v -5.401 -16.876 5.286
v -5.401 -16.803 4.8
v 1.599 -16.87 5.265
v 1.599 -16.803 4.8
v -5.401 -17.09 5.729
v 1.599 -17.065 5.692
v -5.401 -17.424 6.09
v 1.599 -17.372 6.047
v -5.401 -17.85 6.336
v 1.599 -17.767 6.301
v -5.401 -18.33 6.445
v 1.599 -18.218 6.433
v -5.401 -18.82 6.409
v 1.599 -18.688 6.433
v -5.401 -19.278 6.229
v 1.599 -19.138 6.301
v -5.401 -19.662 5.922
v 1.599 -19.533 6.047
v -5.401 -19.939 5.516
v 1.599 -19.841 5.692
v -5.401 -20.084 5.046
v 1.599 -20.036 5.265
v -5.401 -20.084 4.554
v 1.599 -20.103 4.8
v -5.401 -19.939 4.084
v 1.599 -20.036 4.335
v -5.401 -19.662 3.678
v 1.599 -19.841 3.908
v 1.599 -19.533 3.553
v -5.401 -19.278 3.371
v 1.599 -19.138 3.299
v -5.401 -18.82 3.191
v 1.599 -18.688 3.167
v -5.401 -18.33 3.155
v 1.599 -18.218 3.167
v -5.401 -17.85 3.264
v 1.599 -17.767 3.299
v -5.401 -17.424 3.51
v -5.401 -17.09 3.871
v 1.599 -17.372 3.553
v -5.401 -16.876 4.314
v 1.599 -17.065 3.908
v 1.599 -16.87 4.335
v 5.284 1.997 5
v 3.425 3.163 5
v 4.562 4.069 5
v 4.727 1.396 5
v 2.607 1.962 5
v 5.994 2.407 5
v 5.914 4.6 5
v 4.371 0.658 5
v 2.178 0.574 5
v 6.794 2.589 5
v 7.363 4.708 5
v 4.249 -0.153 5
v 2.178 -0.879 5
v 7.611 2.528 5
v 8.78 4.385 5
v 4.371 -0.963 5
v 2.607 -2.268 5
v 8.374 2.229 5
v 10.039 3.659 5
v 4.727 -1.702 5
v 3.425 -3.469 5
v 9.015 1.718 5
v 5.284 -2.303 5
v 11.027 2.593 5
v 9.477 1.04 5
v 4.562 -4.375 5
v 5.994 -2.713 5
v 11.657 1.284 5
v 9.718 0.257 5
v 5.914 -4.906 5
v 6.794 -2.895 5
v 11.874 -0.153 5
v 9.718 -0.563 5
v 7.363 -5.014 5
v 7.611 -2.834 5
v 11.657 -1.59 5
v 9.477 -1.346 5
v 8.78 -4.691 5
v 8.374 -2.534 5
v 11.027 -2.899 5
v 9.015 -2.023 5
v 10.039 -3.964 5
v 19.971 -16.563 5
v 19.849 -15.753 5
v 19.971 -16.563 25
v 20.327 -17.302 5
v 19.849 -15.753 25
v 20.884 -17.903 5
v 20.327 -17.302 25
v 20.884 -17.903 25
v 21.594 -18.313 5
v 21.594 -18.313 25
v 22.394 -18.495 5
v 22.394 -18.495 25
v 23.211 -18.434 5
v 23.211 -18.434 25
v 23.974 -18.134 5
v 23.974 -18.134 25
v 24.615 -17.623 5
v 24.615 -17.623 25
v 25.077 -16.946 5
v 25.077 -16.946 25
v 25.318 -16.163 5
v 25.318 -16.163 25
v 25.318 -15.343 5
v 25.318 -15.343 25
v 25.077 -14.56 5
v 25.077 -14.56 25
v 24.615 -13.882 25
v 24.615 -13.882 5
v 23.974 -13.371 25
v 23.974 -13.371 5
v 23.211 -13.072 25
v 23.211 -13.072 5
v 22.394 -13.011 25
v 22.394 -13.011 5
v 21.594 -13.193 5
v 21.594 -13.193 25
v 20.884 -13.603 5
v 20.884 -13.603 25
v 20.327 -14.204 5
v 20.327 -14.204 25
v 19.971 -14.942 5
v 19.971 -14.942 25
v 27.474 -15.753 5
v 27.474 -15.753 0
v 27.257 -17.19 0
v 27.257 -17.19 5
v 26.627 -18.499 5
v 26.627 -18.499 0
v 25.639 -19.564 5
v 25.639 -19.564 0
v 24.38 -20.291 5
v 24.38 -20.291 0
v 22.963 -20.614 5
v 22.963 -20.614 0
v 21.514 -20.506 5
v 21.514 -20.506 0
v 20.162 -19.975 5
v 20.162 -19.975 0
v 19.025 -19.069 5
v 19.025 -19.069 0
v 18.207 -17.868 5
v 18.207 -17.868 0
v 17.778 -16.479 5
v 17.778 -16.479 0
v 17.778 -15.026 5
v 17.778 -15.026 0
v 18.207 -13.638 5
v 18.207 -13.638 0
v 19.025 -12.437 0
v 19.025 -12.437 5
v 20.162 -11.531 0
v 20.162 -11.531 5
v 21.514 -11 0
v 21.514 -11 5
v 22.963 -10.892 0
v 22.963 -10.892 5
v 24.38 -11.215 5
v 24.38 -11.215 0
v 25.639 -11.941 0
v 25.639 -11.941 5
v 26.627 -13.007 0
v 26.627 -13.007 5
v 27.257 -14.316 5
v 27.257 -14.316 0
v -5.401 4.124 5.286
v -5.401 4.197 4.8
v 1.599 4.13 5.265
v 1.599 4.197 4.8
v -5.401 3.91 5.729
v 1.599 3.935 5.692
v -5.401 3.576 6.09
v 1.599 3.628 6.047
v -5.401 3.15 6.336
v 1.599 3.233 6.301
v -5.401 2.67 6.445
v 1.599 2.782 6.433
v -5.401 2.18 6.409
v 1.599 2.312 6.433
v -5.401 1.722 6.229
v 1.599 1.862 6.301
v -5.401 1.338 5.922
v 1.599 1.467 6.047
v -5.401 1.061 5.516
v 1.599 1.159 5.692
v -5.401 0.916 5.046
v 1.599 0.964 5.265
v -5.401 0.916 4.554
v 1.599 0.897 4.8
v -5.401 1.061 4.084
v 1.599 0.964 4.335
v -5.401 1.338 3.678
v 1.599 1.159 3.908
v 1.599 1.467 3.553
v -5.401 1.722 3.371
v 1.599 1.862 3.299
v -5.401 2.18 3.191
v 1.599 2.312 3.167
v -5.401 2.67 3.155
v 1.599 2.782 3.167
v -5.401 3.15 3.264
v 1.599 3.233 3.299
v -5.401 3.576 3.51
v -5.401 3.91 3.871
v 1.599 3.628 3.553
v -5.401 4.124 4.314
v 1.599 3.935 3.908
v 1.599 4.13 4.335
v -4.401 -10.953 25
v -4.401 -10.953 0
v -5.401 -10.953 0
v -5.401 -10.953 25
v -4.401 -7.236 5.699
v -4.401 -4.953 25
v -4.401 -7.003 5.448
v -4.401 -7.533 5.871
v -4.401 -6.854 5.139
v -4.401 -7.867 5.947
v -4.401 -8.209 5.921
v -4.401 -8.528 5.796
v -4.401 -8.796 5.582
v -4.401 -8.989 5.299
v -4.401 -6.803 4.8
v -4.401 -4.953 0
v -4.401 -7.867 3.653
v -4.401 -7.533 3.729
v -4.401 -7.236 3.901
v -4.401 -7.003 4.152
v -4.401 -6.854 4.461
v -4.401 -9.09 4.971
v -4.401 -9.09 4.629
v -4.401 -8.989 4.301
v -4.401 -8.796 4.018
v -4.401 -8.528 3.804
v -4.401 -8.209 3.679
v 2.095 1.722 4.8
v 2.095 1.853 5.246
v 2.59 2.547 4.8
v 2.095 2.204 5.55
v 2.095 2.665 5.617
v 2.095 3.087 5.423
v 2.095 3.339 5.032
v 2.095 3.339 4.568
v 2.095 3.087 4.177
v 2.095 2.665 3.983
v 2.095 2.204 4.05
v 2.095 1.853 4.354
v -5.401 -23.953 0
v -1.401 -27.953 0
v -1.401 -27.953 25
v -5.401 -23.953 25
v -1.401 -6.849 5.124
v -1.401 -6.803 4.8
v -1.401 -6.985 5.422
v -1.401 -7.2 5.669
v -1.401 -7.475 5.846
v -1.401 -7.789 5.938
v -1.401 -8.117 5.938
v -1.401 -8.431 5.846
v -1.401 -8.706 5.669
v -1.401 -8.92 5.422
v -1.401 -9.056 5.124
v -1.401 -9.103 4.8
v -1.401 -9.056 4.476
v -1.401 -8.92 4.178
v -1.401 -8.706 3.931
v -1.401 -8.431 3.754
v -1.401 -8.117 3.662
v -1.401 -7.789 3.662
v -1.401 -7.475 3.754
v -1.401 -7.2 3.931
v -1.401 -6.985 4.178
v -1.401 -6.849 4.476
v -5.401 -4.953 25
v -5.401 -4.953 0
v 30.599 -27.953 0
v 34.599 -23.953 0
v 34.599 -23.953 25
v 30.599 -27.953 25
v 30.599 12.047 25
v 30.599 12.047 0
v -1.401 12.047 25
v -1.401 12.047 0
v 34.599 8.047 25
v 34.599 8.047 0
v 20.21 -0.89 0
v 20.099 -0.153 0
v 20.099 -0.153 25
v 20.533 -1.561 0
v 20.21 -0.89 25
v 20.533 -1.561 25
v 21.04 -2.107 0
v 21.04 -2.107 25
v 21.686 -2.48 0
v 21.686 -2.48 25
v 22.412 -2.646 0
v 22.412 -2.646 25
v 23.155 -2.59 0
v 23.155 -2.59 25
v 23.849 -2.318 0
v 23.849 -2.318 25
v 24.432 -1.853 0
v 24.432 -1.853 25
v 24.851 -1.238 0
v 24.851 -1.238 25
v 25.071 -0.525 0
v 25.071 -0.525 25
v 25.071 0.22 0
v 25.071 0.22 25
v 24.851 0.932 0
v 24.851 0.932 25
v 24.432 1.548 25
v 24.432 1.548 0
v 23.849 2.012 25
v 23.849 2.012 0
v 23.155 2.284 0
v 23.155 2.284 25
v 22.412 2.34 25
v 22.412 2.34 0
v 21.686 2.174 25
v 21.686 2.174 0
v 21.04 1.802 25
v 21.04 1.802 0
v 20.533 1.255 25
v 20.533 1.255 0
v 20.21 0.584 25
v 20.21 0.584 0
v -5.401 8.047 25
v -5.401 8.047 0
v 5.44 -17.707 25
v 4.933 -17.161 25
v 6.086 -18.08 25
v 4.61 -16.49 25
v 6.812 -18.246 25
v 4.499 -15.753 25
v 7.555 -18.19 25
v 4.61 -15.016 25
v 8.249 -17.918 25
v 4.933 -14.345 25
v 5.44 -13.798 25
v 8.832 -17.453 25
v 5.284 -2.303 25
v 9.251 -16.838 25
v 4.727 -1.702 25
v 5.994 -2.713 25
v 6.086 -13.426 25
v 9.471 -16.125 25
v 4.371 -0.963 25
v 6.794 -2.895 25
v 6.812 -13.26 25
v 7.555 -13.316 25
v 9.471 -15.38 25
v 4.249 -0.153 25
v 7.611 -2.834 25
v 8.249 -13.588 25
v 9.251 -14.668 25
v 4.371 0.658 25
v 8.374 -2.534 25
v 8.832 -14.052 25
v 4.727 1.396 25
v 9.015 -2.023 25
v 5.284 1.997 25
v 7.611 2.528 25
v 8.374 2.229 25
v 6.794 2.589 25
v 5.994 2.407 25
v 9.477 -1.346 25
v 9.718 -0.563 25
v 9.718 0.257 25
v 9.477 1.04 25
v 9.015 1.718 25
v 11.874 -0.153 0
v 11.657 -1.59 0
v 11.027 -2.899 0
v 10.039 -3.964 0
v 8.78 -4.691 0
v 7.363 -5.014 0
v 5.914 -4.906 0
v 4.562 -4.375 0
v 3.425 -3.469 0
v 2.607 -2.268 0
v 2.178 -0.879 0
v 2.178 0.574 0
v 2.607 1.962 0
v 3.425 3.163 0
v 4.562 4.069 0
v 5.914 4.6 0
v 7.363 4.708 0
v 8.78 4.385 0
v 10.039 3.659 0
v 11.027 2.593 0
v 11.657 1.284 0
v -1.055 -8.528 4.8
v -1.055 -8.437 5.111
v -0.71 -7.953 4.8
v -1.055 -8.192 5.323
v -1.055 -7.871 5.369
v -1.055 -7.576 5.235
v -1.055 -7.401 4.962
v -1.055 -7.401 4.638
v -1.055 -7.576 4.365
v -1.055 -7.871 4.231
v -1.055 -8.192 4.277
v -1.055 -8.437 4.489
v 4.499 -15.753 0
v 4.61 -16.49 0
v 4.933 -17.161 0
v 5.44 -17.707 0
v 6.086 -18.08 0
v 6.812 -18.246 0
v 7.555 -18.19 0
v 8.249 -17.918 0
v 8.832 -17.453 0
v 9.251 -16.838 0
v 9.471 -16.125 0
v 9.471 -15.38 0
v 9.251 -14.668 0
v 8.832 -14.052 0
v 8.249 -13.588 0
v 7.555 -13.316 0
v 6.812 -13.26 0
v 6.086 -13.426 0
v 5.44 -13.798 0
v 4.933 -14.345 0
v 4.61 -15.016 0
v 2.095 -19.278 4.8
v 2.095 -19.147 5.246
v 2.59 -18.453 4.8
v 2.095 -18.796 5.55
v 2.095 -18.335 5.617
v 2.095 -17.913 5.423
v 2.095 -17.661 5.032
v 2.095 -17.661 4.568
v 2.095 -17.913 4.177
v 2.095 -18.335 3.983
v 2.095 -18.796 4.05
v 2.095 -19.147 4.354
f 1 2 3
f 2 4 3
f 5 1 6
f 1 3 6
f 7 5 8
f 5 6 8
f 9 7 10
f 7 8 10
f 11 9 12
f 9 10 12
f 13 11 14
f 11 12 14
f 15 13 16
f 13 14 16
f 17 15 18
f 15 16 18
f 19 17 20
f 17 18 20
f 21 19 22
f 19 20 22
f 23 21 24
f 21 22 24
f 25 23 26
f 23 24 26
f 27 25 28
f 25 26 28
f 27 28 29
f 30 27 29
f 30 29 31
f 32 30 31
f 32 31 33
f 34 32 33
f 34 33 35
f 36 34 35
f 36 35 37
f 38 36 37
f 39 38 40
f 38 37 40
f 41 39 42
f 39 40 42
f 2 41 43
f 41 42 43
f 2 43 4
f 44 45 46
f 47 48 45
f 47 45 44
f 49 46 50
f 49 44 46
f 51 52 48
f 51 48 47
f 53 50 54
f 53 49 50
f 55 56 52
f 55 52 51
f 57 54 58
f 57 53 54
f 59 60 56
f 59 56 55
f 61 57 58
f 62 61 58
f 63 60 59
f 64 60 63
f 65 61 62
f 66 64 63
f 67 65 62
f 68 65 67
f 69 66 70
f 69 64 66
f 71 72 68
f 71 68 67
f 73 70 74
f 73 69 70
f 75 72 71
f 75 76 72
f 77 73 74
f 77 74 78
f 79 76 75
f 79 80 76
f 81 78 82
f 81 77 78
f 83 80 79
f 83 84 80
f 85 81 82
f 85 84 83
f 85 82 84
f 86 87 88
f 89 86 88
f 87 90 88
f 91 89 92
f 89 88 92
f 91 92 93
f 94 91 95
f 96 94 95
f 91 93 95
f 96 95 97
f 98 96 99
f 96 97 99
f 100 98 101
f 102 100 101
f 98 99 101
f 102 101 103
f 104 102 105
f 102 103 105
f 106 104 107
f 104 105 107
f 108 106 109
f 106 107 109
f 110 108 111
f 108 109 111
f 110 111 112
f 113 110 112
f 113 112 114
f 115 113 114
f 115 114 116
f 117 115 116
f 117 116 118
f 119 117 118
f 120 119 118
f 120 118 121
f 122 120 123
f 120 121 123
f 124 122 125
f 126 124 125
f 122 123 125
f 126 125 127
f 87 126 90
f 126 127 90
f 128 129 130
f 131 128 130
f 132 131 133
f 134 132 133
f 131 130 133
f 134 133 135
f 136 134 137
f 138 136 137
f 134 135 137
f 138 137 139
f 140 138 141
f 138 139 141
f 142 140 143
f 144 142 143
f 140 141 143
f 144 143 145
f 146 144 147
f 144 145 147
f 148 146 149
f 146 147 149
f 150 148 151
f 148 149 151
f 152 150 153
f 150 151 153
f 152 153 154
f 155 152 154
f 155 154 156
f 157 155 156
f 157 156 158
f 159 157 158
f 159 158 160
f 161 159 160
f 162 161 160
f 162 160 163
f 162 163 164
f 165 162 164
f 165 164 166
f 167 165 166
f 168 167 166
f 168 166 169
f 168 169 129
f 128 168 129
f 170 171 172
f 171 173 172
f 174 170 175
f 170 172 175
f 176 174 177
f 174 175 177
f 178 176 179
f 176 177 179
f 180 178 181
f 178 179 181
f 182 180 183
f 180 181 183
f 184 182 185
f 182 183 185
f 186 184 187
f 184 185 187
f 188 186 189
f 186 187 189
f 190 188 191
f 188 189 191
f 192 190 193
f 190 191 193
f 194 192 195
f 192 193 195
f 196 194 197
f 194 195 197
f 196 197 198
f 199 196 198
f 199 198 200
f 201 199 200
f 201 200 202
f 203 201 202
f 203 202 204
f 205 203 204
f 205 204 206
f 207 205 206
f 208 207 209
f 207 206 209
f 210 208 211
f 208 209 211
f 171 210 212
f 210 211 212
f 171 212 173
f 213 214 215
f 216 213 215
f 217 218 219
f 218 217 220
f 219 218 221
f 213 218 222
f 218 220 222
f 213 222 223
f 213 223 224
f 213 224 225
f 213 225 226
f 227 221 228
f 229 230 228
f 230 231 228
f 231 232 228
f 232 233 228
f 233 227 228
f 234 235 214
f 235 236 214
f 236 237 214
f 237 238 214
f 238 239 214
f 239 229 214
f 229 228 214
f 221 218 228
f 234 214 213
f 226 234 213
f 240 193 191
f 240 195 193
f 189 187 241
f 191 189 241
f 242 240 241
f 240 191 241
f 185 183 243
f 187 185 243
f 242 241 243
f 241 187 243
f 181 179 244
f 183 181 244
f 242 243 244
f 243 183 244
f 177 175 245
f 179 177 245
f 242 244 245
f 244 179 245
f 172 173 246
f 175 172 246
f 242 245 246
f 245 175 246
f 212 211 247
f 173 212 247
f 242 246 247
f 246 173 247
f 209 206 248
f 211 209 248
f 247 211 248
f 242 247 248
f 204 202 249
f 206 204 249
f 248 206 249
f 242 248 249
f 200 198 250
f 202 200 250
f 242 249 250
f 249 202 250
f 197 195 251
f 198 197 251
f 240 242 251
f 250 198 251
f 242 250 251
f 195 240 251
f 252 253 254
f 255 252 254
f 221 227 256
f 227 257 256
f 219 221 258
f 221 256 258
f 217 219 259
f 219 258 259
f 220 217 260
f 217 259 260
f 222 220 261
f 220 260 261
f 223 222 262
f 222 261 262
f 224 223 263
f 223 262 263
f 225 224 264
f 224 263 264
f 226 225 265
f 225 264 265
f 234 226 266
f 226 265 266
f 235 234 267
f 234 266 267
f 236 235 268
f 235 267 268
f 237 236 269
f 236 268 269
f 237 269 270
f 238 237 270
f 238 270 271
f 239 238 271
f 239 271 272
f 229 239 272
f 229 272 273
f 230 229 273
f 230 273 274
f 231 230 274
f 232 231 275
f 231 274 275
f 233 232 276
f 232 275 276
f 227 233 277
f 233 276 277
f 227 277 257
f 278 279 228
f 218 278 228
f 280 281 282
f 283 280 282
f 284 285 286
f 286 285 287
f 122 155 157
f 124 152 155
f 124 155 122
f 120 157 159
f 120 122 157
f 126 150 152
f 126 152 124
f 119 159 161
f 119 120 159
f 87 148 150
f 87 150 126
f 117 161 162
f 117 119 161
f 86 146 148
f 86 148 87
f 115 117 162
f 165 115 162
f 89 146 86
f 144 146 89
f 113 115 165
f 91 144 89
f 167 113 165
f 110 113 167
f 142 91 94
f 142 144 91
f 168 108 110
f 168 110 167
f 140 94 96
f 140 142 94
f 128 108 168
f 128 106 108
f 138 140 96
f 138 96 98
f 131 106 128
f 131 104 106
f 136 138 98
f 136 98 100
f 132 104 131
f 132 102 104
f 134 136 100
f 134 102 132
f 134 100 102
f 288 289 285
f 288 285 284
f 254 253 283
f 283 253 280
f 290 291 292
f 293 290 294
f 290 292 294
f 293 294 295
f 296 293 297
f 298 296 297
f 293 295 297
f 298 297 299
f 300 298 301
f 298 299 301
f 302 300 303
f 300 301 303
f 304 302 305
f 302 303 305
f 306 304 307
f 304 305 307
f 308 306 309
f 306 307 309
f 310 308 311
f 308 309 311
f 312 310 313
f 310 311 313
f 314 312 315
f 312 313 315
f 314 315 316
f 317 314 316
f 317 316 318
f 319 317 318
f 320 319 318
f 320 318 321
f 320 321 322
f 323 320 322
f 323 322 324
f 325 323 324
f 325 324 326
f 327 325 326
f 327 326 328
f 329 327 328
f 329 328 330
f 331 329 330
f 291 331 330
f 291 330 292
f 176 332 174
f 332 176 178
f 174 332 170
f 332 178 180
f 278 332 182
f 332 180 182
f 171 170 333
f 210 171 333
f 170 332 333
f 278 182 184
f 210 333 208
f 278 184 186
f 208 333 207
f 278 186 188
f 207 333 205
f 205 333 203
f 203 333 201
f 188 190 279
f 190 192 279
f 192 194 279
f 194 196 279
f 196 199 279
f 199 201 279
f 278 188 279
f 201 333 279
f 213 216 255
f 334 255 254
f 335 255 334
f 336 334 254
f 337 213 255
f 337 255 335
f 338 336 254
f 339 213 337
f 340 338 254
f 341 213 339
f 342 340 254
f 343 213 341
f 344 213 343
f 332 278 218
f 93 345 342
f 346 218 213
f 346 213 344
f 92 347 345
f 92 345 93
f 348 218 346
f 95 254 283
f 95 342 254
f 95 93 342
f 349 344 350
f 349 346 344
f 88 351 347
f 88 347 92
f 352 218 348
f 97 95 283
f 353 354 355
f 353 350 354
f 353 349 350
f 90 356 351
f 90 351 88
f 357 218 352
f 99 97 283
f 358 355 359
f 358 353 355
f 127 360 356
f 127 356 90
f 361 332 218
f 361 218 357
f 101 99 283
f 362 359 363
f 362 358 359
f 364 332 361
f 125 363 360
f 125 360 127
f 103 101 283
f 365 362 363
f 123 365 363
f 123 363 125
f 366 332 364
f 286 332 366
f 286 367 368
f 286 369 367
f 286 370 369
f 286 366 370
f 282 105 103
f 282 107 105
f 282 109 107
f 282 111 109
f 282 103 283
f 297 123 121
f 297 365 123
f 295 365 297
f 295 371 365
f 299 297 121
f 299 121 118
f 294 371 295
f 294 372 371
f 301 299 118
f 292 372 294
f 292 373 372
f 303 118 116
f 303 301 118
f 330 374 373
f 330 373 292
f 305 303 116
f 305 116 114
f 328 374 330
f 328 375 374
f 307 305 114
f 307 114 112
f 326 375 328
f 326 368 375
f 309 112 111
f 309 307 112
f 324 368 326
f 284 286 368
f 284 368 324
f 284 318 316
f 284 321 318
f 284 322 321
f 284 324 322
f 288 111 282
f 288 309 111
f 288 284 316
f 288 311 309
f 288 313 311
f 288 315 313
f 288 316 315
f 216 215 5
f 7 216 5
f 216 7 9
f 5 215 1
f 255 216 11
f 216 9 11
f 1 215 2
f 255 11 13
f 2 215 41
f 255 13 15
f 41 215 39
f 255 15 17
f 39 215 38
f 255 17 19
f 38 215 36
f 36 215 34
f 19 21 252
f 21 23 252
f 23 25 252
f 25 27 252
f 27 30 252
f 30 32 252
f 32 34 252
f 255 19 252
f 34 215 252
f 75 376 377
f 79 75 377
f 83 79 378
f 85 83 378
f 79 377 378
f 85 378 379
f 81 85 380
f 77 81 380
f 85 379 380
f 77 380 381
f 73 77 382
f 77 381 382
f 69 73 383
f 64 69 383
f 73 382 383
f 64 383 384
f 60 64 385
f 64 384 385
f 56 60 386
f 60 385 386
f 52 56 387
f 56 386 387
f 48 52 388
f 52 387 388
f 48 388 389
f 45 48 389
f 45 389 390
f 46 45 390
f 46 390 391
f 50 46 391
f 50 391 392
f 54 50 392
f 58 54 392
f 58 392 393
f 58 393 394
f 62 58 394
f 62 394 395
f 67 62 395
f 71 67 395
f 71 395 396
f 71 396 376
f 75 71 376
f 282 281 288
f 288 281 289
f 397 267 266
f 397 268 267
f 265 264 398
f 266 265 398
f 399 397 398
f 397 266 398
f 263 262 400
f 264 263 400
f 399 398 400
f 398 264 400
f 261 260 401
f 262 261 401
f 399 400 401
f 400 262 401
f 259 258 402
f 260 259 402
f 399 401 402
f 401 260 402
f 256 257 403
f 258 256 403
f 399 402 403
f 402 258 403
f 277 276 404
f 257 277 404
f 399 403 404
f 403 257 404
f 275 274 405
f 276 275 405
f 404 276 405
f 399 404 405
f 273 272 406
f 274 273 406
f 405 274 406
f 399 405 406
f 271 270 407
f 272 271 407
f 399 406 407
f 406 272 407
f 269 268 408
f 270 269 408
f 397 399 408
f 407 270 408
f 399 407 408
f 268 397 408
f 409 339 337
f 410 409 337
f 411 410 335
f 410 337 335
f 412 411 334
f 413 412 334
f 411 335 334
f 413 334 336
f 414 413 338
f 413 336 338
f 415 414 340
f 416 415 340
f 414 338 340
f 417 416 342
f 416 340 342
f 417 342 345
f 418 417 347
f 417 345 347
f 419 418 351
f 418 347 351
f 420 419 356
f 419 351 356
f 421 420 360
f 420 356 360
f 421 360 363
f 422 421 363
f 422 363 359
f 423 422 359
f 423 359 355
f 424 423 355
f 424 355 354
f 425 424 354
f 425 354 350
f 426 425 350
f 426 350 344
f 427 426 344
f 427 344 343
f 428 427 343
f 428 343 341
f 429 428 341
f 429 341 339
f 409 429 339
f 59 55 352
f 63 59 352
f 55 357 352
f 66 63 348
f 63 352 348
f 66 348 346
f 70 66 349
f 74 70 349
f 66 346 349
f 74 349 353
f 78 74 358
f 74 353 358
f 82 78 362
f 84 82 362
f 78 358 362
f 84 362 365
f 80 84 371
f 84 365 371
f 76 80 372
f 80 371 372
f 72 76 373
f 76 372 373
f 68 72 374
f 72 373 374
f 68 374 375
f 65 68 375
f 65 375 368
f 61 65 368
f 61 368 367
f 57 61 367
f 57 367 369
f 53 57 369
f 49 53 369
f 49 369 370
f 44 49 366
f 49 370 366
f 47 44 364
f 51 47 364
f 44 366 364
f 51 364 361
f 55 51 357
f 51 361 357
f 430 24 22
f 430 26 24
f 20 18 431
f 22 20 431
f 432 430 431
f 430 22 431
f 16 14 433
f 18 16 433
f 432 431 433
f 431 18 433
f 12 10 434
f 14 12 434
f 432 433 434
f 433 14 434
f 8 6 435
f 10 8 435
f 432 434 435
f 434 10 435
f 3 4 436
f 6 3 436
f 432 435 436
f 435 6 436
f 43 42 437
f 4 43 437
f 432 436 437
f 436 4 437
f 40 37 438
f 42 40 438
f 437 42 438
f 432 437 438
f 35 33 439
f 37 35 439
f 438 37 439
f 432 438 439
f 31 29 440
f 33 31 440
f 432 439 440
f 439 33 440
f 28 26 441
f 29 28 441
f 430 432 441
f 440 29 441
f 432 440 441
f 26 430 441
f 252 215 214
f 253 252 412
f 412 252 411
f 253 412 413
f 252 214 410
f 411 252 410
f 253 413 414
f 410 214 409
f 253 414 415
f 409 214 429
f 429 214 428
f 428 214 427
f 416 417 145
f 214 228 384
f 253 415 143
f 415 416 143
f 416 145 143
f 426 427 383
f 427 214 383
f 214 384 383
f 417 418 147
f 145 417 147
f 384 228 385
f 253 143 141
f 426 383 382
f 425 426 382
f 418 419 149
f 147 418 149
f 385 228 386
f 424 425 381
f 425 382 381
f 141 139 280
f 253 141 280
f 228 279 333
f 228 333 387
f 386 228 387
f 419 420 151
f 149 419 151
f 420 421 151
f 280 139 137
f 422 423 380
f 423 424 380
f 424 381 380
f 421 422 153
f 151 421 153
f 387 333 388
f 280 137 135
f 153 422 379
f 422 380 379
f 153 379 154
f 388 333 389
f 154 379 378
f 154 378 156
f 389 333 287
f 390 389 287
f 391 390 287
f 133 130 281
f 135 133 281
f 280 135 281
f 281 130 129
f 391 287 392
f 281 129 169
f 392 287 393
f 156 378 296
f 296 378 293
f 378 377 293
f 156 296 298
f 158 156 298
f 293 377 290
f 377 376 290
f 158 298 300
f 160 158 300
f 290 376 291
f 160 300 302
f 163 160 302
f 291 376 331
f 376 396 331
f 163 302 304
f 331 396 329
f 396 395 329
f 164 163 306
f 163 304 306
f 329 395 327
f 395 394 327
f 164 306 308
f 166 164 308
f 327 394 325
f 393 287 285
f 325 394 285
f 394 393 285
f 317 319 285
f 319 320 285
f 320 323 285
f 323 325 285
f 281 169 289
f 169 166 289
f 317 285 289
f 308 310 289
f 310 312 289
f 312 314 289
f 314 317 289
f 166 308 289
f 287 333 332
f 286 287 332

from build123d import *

# Parameters (mm, degrees)
F1_DEPTH       = 25
F2_SIZE2       = 4
F2_SIZE        = 4
F3_D           = 5.5
F3_CBORE_D     = 9.75
F3_CBORE_DEPTH = 5
F4_D           = 5.5
F4_CBORE_D     = 9.75
F4_CBORE_DEPTH = 5
F5_D           = 5
F6_D           = 5
F9_D           = 3.3
F9_DEPTH       = 7
F9_TIP         = 0.9914200214
F10_D          = 2.3
F10_DEPTH      = 3
F10_TIP        = 0.6909897119


with BuildPart() as f1:
    # F0 (on Top) → F1 (new body)
    with BuildSketch(Plane.XY):
        Polygon((34.59903365, 12.0471221954), (-5.40096635, 12.0471221954), (-5.40096635, -4.9528778046), (-4.40096635, -4.9528778046), (-4.40096635, -10.9528778046), (-5.40096635, -10.9528778046), (-5.40096635, -27.9528778046), (34.59903365, -27.9528778046), align=None)
    extrude(amount=F1_DEPTH)

    # F2
    f2_edges = [f1.edges().sort_by_distance(p)[0] for p in [
        (-5.400966, 12.047122, 12.5),
        (-5.400966, -27.952878, 12.5),
        (34.599034, -27.952878, 12.5),
        (34.599034, 12.047122, 12.5),
    ]]
    chamfer(f2_edges, length=F2_SIZE, length2=F2_SIZE2)

    # F3 (through all)
    with Locations(Plane(origin=(0, 0, 0), x_dir=(1, 0, 0), z_dir=(0, 0, -1))):
        with Locations((6.99903365, 0.1528778046)):
            CounterBoreHole(F3_D / 2, F3_CBORE_D / 2, F3_CBORE_DEPTH)

    # F4 (through all)
    with Locations(Plane(origin=(0, 0, 0), x_dir=(1, 0, 0), z_dir=(0, 0, -1))):
        with Locations((22.59903365, 15.7528778046)):
            CounterBoreHole(F4_D / 2, F4_CBORE_D / 2, F4_CBORE_DEPTH)

    # F5 (through all)
    with Locations(Plane(origin=(0, 0, 0), x_dir=(1, 0, 0), z_dir=(0, 0, -1))):
        with Locations((22.59903365, 0.1528778046)):
            Hole(F5_D / 2)

    # F6 (through all)
    with Locations(Plane(origin=(0, 0, 0), x_dir=(1, 0, 0), z_dir=(0, 0, -1))):
        with Locations((6.99903365, 15.7528778046)):
            Hole(F6_D / 2)

    # F9
    with Locations(Plane(origin=(-5.40096635, 0, 0), x_dir=(0, -1, 0), z_dir=(-1, 0, 0))):
        with Locations((-2.5471221954, 4.8), (18.4528778046, 4.8)):
            Hole(F9_D / 2, depth=F9_DEPTH)
            with Locations((0, 0, -(F9_DEPTH + F9_TIP / 2))):  # 118° drill point
                Cone(0, F9_D / 2, F9_TIP, mode=Mode.SUBTRACT)

    # F10
    with Locations(Plane(origin=(-4.40096635, 0, 0), x_dir=(0, -1, 0), z_dir=(-1, 0, 0))):
        with Locations((7.9528778046, 4.8)):
            Hole(F10_D / 2, depth=F10_DEPTH)
            with Locations((0, 0, -(F10_DEPTH + F10_TIP / 2))):  # 118° drill point
                Cone(0, F10_D / 2, F10_TIP, mode=Mode.SUBTRACT)


solid = f1.part
